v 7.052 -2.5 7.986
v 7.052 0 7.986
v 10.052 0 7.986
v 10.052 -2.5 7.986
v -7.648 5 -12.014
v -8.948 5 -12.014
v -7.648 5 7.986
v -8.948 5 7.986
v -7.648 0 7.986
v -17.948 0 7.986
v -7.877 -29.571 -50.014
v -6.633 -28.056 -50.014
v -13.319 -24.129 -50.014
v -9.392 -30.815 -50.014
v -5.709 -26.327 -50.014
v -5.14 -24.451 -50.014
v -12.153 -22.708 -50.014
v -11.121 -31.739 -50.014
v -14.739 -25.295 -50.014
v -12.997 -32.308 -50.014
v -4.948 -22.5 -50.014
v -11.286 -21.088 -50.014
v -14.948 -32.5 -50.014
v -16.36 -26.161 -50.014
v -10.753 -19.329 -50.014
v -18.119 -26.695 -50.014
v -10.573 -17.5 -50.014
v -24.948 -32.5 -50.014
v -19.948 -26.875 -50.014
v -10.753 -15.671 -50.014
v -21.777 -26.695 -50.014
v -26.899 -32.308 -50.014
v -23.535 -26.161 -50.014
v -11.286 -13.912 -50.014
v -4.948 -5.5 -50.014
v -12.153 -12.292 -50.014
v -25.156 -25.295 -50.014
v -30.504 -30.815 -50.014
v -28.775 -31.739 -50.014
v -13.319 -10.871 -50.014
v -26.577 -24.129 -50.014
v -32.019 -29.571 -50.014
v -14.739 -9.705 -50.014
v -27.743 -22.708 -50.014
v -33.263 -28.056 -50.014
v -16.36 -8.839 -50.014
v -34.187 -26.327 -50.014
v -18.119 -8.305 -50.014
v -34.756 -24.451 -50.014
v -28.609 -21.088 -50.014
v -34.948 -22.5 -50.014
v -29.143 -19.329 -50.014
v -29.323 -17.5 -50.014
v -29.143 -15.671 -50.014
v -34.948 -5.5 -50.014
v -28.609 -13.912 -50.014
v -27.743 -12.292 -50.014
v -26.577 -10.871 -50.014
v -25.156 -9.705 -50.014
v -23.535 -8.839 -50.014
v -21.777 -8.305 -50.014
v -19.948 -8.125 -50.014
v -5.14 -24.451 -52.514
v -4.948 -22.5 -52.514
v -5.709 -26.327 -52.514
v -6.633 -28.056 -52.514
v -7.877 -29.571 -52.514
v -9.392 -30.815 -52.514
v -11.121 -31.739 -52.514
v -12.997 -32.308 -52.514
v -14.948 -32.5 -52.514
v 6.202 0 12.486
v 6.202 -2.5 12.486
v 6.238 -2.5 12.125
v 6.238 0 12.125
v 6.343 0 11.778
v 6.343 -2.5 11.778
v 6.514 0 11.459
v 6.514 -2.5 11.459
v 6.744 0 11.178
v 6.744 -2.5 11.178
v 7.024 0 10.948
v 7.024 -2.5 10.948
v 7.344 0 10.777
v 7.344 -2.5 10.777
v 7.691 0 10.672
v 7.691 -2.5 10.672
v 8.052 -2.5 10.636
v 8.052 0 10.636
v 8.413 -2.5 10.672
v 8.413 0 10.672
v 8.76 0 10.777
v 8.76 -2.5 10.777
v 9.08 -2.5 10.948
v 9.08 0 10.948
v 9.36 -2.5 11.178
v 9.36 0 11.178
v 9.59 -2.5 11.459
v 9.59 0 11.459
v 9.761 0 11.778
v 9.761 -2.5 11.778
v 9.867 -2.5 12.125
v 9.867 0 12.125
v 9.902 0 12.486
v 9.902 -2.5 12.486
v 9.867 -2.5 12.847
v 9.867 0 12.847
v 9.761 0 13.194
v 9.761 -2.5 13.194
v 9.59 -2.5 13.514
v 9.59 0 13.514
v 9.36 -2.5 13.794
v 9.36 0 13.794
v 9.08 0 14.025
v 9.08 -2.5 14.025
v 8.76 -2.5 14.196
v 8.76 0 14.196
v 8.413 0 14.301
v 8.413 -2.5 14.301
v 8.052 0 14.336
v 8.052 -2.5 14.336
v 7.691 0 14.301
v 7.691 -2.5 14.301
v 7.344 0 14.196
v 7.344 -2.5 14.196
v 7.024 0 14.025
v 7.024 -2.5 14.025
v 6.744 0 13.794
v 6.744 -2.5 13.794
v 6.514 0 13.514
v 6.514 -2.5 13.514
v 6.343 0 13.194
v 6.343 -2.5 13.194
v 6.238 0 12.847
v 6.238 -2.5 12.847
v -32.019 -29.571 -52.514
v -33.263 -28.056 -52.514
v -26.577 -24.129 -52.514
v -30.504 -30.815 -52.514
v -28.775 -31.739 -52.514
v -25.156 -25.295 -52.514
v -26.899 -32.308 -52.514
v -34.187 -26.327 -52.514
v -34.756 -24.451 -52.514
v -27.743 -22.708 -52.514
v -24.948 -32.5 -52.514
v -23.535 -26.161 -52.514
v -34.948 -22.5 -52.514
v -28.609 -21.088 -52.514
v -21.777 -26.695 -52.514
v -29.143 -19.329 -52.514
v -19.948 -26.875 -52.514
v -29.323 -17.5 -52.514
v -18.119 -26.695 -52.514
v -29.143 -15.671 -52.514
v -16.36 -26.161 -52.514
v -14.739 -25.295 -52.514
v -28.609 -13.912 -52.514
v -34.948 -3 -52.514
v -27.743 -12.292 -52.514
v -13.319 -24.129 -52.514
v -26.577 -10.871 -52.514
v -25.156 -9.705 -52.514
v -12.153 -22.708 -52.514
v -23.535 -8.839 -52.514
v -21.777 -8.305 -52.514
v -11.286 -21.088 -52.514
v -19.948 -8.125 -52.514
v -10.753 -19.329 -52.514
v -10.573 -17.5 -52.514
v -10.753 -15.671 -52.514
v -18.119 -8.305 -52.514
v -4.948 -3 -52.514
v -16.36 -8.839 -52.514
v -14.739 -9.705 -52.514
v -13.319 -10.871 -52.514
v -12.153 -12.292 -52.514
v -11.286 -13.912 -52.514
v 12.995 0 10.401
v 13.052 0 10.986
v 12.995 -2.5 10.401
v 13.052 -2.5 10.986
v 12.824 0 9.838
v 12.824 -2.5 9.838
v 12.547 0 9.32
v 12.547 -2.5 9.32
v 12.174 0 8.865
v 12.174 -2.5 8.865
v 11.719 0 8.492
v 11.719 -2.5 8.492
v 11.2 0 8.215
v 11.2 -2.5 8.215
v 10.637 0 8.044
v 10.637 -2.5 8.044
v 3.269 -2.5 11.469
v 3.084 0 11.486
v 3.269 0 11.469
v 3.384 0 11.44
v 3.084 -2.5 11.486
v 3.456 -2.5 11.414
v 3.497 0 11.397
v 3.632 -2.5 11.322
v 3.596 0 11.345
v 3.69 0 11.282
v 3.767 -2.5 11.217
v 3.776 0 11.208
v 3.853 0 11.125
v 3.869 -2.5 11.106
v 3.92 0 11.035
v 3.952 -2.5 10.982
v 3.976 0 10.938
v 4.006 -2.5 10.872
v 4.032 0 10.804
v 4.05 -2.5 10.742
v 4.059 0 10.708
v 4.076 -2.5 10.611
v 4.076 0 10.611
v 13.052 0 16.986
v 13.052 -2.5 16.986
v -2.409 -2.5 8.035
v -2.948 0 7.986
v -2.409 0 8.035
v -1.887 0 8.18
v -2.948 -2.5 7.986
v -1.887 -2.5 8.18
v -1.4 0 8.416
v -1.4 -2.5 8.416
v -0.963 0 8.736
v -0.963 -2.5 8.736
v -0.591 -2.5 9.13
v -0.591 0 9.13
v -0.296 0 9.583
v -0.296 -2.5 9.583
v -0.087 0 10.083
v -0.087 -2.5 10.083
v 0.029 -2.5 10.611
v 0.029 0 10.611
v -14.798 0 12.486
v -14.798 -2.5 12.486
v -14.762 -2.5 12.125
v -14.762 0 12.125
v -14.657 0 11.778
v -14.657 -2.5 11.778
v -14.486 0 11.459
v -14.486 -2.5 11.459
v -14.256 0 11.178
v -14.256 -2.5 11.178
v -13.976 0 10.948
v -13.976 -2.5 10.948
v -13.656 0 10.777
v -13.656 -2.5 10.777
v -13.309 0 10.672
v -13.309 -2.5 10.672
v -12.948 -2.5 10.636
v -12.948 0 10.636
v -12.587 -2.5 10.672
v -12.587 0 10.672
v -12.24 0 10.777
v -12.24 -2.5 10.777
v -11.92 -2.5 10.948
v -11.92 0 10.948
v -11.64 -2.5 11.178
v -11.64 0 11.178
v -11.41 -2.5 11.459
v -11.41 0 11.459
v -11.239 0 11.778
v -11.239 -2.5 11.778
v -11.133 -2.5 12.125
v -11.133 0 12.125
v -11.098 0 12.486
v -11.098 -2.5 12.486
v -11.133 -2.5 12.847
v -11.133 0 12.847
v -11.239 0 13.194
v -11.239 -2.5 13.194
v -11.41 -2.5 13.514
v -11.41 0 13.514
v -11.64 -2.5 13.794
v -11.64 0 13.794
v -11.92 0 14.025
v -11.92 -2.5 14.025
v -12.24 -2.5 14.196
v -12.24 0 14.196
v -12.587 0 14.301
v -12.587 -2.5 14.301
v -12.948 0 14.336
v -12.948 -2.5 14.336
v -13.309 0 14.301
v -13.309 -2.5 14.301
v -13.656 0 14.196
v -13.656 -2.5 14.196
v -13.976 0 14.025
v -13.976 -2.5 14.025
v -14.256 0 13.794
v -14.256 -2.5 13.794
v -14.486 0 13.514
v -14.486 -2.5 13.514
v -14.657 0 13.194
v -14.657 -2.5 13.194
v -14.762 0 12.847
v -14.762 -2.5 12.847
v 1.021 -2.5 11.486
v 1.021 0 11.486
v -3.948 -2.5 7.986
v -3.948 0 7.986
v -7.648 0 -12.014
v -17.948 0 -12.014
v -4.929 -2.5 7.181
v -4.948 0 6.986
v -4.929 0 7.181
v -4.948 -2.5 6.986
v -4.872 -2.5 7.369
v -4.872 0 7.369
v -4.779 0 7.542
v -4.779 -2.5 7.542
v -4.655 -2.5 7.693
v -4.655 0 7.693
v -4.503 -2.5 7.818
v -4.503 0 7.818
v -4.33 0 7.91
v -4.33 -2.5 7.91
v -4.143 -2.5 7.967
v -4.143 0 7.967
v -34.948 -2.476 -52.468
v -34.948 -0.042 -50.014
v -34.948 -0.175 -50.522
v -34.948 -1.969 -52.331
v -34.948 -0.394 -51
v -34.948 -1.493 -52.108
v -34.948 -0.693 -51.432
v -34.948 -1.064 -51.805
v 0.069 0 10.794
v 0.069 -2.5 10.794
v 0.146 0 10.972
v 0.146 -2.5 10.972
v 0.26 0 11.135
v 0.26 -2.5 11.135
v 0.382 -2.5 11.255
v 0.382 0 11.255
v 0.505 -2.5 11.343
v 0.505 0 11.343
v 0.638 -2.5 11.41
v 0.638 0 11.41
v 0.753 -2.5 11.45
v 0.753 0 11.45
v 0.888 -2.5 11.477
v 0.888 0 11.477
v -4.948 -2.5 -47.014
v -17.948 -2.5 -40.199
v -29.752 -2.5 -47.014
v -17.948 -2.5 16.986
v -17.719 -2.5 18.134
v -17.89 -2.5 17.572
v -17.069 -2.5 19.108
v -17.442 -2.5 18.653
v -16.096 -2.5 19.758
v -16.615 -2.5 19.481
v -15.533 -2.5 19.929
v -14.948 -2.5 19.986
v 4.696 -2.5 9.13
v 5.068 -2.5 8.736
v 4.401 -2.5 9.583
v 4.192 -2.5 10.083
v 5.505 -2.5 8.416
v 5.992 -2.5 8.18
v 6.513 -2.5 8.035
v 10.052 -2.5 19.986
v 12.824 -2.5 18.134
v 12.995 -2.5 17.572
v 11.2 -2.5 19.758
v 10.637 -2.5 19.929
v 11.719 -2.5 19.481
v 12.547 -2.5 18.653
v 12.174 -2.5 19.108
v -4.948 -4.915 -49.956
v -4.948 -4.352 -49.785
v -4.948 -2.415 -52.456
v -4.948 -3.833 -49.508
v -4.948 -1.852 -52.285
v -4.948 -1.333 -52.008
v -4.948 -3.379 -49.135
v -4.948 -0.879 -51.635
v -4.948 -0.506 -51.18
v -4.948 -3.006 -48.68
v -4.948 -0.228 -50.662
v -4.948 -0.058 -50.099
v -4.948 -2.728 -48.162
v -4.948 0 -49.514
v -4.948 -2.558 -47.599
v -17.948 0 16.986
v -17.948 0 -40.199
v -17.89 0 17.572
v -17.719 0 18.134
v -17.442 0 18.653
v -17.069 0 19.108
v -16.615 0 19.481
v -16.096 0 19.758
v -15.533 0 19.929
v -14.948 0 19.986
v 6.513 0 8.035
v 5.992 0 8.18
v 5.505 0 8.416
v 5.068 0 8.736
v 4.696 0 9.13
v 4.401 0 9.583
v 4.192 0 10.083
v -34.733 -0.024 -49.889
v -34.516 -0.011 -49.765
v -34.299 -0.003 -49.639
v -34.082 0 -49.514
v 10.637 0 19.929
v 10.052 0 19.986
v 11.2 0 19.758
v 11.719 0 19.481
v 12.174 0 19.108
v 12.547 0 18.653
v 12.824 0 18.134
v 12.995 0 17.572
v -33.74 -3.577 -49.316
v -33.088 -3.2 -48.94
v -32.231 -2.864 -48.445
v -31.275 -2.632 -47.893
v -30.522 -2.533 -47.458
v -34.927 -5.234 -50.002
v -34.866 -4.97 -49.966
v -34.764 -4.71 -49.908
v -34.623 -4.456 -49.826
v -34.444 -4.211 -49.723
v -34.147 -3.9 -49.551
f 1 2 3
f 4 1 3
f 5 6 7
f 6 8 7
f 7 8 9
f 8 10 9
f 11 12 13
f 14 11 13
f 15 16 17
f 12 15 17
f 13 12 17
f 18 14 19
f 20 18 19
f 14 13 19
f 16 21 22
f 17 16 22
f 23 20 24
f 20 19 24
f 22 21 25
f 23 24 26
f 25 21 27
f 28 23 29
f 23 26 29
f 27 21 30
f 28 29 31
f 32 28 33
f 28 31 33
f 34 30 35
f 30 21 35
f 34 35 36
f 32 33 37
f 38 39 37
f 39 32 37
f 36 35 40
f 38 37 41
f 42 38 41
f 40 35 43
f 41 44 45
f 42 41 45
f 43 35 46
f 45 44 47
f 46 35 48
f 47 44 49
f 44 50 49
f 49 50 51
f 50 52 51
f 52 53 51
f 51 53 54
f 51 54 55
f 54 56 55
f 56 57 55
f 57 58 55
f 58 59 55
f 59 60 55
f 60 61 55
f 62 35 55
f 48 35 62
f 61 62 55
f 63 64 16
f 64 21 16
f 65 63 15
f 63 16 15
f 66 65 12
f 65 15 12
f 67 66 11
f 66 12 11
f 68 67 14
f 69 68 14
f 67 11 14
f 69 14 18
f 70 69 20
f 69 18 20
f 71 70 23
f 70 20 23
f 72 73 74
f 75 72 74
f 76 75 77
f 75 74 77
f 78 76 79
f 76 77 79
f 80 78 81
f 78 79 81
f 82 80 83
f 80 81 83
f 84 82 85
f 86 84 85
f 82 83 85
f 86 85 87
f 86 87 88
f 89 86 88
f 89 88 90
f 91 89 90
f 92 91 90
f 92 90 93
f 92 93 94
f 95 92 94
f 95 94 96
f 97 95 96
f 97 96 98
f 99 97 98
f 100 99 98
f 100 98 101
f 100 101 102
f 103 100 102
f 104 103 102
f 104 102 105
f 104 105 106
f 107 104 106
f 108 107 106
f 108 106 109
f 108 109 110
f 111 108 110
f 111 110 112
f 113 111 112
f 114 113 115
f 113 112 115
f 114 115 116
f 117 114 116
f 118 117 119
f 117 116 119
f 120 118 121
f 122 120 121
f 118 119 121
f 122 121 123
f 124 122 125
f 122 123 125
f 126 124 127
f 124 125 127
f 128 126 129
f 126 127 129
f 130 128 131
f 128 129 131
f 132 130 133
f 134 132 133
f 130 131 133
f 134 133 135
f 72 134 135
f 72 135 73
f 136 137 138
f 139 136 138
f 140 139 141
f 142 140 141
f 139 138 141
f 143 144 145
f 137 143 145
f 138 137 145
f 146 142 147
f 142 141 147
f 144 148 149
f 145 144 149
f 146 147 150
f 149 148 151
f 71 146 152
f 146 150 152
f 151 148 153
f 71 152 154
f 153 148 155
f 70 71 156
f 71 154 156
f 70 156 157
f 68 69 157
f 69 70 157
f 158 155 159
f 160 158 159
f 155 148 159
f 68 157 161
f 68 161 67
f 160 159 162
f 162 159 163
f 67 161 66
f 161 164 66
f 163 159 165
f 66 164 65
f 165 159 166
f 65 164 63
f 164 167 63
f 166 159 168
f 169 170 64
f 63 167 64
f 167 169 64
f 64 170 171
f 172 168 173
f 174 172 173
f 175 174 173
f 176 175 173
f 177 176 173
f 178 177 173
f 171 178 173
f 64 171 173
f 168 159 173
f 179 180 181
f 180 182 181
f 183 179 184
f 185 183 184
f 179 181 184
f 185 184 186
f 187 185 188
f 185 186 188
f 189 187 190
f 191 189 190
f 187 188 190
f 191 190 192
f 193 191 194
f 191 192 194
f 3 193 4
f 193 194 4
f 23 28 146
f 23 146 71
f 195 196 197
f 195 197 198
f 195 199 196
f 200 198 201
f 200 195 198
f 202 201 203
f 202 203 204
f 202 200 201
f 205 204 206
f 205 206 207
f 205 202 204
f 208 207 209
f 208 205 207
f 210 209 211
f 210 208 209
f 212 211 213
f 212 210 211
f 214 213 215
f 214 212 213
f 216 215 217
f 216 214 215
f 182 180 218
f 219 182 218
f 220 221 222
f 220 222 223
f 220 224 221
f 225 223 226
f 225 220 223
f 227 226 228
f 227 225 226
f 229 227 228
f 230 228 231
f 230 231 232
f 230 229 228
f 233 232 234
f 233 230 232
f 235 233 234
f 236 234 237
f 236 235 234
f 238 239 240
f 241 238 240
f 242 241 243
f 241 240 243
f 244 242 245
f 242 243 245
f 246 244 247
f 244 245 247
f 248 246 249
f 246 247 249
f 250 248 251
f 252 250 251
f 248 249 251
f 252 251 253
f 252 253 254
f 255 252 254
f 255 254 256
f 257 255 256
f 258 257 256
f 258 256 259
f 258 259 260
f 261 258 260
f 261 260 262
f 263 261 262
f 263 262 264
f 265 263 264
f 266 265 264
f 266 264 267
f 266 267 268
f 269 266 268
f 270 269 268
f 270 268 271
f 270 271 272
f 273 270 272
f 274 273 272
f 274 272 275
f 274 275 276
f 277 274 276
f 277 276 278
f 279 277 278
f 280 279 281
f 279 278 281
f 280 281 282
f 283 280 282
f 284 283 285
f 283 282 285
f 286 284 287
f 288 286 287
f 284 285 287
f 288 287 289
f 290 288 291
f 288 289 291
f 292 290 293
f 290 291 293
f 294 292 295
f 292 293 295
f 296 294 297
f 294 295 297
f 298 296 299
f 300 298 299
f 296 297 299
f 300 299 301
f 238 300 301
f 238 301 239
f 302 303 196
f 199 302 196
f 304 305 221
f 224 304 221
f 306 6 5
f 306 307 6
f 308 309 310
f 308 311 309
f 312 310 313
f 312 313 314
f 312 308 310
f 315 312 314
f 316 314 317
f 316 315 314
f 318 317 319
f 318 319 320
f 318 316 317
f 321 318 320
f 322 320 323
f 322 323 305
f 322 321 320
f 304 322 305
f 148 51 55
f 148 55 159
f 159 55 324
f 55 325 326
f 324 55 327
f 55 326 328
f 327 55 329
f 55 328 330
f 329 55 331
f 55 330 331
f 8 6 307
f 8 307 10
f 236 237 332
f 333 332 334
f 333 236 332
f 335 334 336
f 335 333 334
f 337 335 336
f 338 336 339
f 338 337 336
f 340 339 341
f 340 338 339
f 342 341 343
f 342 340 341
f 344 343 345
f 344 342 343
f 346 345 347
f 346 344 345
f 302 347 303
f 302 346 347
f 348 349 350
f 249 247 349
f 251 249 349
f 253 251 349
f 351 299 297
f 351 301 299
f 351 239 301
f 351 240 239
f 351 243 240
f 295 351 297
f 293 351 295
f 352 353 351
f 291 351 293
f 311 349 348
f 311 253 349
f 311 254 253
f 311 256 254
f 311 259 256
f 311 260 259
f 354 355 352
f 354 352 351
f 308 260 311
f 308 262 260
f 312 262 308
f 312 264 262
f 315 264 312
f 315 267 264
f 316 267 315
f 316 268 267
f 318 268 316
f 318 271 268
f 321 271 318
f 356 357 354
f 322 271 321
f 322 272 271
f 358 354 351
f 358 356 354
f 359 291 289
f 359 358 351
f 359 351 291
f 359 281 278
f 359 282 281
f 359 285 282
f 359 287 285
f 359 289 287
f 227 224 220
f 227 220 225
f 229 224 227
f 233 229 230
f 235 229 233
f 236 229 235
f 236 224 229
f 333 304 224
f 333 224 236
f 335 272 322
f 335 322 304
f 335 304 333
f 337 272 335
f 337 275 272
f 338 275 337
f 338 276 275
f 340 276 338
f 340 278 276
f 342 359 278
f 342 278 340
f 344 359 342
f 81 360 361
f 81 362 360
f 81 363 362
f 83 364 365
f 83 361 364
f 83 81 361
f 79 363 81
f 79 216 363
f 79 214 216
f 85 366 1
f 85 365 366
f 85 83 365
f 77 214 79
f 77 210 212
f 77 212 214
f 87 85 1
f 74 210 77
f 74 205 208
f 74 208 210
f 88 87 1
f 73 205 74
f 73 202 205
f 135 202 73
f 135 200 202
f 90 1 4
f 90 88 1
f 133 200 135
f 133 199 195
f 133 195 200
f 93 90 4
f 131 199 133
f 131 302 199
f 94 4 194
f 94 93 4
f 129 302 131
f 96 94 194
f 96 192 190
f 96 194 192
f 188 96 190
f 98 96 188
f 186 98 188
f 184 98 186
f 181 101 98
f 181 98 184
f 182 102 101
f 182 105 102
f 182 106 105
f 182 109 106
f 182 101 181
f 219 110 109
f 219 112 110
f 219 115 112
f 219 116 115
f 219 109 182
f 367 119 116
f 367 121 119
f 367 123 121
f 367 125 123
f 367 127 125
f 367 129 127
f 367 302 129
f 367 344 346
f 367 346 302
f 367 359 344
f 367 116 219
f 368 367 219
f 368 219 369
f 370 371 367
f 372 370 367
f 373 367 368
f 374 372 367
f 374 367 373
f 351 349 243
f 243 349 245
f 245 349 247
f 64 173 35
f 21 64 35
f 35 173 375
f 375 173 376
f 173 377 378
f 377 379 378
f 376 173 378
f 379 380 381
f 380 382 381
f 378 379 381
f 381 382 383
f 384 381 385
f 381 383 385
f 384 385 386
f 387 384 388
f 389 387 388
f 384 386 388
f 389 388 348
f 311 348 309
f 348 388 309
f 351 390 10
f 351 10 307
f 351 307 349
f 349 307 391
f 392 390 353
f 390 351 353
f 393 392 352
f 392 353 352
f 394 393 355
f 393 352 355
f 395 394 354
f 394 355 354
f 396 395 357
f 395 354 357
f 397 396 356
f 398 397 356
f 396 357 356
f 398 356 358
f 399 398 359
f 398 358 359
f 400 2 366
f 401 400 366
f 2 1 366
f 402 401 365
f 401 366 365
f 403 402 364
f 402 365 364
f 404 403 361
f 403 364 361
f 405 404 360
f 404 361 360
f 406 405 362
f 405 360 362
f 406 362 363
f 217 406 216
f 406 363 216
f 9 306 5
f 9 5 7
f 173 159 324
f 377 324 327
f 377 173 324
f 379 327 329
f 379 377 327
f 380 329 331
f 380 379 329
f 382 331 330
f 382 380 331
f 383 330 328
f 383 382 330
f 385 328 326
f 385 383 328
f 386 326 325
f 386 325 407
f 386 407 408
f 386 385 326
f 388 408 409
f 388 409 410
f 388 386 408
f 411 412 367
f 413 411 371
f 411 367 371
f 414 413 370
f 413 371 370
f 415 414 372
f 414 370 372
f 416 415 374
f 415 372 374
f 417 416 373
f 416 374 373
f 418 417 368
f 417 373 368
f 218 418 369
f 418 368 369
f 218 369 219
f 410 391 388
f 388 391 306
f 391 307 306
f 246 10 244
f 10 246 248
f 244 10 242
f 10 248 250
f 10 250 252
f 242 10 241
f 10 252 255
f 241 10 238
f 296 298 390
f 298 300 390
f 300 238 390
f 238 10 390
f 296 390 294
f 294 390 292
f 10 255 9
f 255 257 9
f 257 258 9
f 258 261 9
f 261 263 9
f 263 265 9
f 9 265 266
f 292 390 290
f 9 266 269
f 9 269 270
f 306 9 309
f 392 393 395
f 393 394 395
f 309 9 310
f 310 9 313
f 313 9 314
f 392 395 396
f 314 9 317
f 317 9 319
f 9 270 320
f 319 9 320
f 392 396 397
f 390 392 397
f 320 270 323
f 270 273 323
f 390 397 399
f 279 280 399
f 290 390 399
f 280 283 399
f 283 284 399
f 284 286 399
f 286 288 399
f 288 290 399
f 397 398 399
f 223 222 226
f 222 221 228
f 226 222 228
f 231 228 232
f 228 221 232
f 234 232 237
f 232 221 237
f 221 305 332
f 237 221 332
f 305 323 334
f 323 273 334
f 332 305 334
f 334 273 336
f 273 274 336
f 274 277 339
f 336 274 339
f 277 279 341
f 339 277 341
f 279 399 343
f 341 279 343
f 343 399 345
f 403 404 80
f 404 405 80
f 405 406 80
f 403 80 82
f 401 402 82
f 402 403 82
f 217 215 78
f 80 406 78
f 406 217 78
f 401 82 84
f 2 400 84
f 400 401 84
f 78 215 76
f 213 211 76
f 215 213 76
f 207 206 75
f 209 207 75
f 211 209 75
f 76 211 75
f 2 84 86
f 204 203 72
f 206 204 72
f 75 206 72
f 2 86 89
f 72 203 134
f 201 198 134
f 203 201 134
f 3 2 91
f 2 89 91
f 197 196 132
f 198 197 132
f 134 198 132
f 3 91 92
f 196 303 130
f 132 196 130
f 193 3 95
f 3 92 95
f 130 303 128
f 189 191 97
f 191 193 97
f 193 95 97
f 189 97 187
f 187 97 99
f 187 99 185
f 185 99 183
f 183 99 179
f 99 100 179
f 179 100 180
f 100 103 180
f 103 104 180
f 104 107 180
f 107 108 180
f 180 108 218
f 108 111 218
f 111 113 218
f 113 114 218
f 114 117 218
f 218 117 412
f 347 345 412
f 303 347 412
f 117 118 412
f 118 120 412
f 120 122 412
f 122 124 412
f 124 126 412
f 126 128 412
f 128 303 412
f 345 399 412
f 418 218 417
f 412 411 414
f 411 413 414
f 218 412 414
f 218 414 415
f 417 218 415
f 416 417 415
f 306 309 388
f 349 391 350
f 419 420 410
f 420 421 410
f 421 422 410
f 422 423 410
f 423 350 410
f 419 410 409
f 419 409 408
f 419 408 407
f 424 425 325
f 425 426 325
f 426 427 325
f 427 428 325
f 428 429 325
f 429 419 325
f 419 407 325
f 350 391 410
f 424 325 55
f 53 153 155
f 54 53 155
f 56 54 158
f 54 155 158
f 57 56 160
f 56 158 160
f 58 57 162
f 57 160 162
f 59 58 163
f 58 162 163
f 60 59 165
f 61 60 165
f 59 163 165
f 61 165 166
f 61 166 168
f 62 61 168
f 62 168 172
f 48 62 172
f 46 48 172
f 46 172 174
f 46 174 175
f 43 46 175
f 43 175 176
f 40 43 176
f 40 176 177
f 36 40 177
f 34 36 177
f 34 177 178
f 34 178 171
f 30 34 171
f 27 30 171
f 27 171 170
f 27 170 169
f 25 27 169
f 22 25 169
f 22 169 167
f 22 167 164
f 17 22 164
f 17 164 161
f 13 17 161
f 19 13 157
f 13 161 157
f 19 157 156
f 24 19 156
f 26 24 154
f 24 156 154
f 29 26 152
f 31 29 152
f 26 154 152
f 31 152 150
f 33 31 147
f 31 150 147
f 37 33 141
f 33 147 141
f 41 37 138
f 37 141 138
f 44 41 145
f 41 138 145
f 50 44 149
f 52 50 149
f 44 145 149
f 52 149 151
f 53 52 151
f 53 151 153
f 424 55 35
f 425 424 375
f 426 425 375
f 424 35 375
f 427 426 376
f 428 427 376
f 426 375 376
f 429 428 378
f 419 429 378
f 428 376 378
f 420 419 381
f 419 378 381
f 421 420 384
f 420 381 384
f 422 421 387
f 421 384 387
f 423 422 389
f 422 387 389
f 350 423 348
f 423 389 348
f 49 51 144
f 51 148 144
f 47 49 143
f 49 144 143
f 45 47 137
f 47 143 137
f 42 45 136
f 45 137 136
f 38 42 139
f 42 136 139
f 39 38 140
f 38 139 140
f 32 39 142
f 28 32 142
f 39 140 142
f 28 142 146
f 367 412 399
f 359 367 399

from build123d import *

# Parameters (mm, degrees)
F0_W     = 10.3
F0_H     = 20
F0_W_2   = 2.7
F1_DEPTH = 2.5
F2_DEPTH = 32.5
F4_D     = 18.75
F5_D     = 3.7
F6_DEPTH = 5
F7_SIZE2 = 9
F7_SIZE  = 5
F8_R     = 10
F9_R     = 3
F10_R    = 1


with BuildPart() as f1:
    # F0 (on Front) → F1 (new body)
    with BuildSketch(Plane.XZ):
        Polygon((13.0521883406, 19.9863334329), (-17.9478116594, 19.9863334329), (-17.9478116594, 7.9863334329), (-7.6478116594, 7.9863334329), (-4.9478116594, 7.9863334329), (0.0521883406, 7.9863334329), (0.0521883406, 11.4863334329), (4.0521883406, 11.4863334329), (4.0521883406, 7.9863334329), (13.0521883406, 7.9863334329), align=None)
        Polygon((-17.9478116594, -50.0136665671), (-17.9478116594, -40.1987119909), (-34.9478116594, -50.0136665671), align=None)
        with Locations((-12.7978116594, -2.0136665671)):
            Rectangle(F0_W, F0_H)
        with Locations((-6.2978116594, -2.0136665671)):
            Rectangle(F0_W_2, F0_H)
        Polygon((-7.6478116594, -12.0136665671), (-17.9478116594, -12.0136665671), (-17.9478116594, -40.1987119909), (-17.9478116594, -50.0136665671), (-4.9478116594, -50.0136665671), (-4.9478116594, -12.0136665671), align=None)
    extrude(amount=F1_DEPTH)

    # F0 (on Front) → F2 (join)
    with BuildSketch(Plane.XZ):
        Polygon((-4.9478116594, -50.0136665671), (-17.9478116594, -50.0136665671), (-34.9478116594, -50.0136665671), (-34.9478116594, -52.5136665671), (-4.9478116594, -52.5136665671), align=None)
    extrude(amount=F2_DEPTH)

    # F4 (through all)
    with Locations(Plane.XY):
        with Locations((-19.9478116594, -17.5)):
            Hole(F4_D / 2)

    # F5 (through all)
    with Locations(Plane(origin=(0, 0, 0), x_dir=(1, 0, 0), z_dir=(0, 1, 0))):
        with Locations((-12.9478116594, -12.4863334329), (8.0521883406, -12.4863334329)):
            Hole(F5_D / 2)

    # F0 (on Front) → F6 (join)
    with BuildSketch(Plane.XZ):
        with Locations((-12.7978116594, -2.0136665671)):
            Rectangle(F0_W, F0_H)
    extrude(amount=-F6_DEPTH)

    # F7
    f7_edges = [f1.edges().sort_by_distance(p)[0] for p in [
        (-17.947812, 5, -2.013667),
    ]]
    f7_side = f1.faces().sort_by_distance((-17.947812, 0.247229, -6.875159))[0]
    chamfer(f7_edges, length=F7_SIZE, length2=F7_SIZE2, reference=f7_side)

    # F8
    f8_edges = [f1.edges().sort_by_distance(p)[0] for p in [
        (-4.947812, -32.5, -51.263667),
        (-34.947812, -32.5, -51.263667),
    ]]
    fillet(f8_edges, radius=F8_R)

    # F9
    f9_edges = [f1.edges().sort_by_distance(p)[0] for p in [
        (-17.947812, -1.25, 19.986333),
        (13.052188, -1.25, 19.986333),
        (0.052188, -1.25, 7.986333),
        (4.052188, -1.25, 7.986333),
        (13.052188, -1.25, 7.986333),
        (-19.947812, 0, -52.513667),
        (-19.947812, -2.5, -50.013667),
    ]]
    fillet(f9_edges, radius=F9_R)

    # F10
    f10_edges = [f1.edges().sort_by_distance(p)[0] for p in [
        (0.052188, -1.25, 11.486333),
        (4.052188, -1.25, 11.486333),
        (-4.947812, -1.25, 7.986333),
    ]]
    fillet(f10_edges, radius=F10_R)


solid = f1.part
